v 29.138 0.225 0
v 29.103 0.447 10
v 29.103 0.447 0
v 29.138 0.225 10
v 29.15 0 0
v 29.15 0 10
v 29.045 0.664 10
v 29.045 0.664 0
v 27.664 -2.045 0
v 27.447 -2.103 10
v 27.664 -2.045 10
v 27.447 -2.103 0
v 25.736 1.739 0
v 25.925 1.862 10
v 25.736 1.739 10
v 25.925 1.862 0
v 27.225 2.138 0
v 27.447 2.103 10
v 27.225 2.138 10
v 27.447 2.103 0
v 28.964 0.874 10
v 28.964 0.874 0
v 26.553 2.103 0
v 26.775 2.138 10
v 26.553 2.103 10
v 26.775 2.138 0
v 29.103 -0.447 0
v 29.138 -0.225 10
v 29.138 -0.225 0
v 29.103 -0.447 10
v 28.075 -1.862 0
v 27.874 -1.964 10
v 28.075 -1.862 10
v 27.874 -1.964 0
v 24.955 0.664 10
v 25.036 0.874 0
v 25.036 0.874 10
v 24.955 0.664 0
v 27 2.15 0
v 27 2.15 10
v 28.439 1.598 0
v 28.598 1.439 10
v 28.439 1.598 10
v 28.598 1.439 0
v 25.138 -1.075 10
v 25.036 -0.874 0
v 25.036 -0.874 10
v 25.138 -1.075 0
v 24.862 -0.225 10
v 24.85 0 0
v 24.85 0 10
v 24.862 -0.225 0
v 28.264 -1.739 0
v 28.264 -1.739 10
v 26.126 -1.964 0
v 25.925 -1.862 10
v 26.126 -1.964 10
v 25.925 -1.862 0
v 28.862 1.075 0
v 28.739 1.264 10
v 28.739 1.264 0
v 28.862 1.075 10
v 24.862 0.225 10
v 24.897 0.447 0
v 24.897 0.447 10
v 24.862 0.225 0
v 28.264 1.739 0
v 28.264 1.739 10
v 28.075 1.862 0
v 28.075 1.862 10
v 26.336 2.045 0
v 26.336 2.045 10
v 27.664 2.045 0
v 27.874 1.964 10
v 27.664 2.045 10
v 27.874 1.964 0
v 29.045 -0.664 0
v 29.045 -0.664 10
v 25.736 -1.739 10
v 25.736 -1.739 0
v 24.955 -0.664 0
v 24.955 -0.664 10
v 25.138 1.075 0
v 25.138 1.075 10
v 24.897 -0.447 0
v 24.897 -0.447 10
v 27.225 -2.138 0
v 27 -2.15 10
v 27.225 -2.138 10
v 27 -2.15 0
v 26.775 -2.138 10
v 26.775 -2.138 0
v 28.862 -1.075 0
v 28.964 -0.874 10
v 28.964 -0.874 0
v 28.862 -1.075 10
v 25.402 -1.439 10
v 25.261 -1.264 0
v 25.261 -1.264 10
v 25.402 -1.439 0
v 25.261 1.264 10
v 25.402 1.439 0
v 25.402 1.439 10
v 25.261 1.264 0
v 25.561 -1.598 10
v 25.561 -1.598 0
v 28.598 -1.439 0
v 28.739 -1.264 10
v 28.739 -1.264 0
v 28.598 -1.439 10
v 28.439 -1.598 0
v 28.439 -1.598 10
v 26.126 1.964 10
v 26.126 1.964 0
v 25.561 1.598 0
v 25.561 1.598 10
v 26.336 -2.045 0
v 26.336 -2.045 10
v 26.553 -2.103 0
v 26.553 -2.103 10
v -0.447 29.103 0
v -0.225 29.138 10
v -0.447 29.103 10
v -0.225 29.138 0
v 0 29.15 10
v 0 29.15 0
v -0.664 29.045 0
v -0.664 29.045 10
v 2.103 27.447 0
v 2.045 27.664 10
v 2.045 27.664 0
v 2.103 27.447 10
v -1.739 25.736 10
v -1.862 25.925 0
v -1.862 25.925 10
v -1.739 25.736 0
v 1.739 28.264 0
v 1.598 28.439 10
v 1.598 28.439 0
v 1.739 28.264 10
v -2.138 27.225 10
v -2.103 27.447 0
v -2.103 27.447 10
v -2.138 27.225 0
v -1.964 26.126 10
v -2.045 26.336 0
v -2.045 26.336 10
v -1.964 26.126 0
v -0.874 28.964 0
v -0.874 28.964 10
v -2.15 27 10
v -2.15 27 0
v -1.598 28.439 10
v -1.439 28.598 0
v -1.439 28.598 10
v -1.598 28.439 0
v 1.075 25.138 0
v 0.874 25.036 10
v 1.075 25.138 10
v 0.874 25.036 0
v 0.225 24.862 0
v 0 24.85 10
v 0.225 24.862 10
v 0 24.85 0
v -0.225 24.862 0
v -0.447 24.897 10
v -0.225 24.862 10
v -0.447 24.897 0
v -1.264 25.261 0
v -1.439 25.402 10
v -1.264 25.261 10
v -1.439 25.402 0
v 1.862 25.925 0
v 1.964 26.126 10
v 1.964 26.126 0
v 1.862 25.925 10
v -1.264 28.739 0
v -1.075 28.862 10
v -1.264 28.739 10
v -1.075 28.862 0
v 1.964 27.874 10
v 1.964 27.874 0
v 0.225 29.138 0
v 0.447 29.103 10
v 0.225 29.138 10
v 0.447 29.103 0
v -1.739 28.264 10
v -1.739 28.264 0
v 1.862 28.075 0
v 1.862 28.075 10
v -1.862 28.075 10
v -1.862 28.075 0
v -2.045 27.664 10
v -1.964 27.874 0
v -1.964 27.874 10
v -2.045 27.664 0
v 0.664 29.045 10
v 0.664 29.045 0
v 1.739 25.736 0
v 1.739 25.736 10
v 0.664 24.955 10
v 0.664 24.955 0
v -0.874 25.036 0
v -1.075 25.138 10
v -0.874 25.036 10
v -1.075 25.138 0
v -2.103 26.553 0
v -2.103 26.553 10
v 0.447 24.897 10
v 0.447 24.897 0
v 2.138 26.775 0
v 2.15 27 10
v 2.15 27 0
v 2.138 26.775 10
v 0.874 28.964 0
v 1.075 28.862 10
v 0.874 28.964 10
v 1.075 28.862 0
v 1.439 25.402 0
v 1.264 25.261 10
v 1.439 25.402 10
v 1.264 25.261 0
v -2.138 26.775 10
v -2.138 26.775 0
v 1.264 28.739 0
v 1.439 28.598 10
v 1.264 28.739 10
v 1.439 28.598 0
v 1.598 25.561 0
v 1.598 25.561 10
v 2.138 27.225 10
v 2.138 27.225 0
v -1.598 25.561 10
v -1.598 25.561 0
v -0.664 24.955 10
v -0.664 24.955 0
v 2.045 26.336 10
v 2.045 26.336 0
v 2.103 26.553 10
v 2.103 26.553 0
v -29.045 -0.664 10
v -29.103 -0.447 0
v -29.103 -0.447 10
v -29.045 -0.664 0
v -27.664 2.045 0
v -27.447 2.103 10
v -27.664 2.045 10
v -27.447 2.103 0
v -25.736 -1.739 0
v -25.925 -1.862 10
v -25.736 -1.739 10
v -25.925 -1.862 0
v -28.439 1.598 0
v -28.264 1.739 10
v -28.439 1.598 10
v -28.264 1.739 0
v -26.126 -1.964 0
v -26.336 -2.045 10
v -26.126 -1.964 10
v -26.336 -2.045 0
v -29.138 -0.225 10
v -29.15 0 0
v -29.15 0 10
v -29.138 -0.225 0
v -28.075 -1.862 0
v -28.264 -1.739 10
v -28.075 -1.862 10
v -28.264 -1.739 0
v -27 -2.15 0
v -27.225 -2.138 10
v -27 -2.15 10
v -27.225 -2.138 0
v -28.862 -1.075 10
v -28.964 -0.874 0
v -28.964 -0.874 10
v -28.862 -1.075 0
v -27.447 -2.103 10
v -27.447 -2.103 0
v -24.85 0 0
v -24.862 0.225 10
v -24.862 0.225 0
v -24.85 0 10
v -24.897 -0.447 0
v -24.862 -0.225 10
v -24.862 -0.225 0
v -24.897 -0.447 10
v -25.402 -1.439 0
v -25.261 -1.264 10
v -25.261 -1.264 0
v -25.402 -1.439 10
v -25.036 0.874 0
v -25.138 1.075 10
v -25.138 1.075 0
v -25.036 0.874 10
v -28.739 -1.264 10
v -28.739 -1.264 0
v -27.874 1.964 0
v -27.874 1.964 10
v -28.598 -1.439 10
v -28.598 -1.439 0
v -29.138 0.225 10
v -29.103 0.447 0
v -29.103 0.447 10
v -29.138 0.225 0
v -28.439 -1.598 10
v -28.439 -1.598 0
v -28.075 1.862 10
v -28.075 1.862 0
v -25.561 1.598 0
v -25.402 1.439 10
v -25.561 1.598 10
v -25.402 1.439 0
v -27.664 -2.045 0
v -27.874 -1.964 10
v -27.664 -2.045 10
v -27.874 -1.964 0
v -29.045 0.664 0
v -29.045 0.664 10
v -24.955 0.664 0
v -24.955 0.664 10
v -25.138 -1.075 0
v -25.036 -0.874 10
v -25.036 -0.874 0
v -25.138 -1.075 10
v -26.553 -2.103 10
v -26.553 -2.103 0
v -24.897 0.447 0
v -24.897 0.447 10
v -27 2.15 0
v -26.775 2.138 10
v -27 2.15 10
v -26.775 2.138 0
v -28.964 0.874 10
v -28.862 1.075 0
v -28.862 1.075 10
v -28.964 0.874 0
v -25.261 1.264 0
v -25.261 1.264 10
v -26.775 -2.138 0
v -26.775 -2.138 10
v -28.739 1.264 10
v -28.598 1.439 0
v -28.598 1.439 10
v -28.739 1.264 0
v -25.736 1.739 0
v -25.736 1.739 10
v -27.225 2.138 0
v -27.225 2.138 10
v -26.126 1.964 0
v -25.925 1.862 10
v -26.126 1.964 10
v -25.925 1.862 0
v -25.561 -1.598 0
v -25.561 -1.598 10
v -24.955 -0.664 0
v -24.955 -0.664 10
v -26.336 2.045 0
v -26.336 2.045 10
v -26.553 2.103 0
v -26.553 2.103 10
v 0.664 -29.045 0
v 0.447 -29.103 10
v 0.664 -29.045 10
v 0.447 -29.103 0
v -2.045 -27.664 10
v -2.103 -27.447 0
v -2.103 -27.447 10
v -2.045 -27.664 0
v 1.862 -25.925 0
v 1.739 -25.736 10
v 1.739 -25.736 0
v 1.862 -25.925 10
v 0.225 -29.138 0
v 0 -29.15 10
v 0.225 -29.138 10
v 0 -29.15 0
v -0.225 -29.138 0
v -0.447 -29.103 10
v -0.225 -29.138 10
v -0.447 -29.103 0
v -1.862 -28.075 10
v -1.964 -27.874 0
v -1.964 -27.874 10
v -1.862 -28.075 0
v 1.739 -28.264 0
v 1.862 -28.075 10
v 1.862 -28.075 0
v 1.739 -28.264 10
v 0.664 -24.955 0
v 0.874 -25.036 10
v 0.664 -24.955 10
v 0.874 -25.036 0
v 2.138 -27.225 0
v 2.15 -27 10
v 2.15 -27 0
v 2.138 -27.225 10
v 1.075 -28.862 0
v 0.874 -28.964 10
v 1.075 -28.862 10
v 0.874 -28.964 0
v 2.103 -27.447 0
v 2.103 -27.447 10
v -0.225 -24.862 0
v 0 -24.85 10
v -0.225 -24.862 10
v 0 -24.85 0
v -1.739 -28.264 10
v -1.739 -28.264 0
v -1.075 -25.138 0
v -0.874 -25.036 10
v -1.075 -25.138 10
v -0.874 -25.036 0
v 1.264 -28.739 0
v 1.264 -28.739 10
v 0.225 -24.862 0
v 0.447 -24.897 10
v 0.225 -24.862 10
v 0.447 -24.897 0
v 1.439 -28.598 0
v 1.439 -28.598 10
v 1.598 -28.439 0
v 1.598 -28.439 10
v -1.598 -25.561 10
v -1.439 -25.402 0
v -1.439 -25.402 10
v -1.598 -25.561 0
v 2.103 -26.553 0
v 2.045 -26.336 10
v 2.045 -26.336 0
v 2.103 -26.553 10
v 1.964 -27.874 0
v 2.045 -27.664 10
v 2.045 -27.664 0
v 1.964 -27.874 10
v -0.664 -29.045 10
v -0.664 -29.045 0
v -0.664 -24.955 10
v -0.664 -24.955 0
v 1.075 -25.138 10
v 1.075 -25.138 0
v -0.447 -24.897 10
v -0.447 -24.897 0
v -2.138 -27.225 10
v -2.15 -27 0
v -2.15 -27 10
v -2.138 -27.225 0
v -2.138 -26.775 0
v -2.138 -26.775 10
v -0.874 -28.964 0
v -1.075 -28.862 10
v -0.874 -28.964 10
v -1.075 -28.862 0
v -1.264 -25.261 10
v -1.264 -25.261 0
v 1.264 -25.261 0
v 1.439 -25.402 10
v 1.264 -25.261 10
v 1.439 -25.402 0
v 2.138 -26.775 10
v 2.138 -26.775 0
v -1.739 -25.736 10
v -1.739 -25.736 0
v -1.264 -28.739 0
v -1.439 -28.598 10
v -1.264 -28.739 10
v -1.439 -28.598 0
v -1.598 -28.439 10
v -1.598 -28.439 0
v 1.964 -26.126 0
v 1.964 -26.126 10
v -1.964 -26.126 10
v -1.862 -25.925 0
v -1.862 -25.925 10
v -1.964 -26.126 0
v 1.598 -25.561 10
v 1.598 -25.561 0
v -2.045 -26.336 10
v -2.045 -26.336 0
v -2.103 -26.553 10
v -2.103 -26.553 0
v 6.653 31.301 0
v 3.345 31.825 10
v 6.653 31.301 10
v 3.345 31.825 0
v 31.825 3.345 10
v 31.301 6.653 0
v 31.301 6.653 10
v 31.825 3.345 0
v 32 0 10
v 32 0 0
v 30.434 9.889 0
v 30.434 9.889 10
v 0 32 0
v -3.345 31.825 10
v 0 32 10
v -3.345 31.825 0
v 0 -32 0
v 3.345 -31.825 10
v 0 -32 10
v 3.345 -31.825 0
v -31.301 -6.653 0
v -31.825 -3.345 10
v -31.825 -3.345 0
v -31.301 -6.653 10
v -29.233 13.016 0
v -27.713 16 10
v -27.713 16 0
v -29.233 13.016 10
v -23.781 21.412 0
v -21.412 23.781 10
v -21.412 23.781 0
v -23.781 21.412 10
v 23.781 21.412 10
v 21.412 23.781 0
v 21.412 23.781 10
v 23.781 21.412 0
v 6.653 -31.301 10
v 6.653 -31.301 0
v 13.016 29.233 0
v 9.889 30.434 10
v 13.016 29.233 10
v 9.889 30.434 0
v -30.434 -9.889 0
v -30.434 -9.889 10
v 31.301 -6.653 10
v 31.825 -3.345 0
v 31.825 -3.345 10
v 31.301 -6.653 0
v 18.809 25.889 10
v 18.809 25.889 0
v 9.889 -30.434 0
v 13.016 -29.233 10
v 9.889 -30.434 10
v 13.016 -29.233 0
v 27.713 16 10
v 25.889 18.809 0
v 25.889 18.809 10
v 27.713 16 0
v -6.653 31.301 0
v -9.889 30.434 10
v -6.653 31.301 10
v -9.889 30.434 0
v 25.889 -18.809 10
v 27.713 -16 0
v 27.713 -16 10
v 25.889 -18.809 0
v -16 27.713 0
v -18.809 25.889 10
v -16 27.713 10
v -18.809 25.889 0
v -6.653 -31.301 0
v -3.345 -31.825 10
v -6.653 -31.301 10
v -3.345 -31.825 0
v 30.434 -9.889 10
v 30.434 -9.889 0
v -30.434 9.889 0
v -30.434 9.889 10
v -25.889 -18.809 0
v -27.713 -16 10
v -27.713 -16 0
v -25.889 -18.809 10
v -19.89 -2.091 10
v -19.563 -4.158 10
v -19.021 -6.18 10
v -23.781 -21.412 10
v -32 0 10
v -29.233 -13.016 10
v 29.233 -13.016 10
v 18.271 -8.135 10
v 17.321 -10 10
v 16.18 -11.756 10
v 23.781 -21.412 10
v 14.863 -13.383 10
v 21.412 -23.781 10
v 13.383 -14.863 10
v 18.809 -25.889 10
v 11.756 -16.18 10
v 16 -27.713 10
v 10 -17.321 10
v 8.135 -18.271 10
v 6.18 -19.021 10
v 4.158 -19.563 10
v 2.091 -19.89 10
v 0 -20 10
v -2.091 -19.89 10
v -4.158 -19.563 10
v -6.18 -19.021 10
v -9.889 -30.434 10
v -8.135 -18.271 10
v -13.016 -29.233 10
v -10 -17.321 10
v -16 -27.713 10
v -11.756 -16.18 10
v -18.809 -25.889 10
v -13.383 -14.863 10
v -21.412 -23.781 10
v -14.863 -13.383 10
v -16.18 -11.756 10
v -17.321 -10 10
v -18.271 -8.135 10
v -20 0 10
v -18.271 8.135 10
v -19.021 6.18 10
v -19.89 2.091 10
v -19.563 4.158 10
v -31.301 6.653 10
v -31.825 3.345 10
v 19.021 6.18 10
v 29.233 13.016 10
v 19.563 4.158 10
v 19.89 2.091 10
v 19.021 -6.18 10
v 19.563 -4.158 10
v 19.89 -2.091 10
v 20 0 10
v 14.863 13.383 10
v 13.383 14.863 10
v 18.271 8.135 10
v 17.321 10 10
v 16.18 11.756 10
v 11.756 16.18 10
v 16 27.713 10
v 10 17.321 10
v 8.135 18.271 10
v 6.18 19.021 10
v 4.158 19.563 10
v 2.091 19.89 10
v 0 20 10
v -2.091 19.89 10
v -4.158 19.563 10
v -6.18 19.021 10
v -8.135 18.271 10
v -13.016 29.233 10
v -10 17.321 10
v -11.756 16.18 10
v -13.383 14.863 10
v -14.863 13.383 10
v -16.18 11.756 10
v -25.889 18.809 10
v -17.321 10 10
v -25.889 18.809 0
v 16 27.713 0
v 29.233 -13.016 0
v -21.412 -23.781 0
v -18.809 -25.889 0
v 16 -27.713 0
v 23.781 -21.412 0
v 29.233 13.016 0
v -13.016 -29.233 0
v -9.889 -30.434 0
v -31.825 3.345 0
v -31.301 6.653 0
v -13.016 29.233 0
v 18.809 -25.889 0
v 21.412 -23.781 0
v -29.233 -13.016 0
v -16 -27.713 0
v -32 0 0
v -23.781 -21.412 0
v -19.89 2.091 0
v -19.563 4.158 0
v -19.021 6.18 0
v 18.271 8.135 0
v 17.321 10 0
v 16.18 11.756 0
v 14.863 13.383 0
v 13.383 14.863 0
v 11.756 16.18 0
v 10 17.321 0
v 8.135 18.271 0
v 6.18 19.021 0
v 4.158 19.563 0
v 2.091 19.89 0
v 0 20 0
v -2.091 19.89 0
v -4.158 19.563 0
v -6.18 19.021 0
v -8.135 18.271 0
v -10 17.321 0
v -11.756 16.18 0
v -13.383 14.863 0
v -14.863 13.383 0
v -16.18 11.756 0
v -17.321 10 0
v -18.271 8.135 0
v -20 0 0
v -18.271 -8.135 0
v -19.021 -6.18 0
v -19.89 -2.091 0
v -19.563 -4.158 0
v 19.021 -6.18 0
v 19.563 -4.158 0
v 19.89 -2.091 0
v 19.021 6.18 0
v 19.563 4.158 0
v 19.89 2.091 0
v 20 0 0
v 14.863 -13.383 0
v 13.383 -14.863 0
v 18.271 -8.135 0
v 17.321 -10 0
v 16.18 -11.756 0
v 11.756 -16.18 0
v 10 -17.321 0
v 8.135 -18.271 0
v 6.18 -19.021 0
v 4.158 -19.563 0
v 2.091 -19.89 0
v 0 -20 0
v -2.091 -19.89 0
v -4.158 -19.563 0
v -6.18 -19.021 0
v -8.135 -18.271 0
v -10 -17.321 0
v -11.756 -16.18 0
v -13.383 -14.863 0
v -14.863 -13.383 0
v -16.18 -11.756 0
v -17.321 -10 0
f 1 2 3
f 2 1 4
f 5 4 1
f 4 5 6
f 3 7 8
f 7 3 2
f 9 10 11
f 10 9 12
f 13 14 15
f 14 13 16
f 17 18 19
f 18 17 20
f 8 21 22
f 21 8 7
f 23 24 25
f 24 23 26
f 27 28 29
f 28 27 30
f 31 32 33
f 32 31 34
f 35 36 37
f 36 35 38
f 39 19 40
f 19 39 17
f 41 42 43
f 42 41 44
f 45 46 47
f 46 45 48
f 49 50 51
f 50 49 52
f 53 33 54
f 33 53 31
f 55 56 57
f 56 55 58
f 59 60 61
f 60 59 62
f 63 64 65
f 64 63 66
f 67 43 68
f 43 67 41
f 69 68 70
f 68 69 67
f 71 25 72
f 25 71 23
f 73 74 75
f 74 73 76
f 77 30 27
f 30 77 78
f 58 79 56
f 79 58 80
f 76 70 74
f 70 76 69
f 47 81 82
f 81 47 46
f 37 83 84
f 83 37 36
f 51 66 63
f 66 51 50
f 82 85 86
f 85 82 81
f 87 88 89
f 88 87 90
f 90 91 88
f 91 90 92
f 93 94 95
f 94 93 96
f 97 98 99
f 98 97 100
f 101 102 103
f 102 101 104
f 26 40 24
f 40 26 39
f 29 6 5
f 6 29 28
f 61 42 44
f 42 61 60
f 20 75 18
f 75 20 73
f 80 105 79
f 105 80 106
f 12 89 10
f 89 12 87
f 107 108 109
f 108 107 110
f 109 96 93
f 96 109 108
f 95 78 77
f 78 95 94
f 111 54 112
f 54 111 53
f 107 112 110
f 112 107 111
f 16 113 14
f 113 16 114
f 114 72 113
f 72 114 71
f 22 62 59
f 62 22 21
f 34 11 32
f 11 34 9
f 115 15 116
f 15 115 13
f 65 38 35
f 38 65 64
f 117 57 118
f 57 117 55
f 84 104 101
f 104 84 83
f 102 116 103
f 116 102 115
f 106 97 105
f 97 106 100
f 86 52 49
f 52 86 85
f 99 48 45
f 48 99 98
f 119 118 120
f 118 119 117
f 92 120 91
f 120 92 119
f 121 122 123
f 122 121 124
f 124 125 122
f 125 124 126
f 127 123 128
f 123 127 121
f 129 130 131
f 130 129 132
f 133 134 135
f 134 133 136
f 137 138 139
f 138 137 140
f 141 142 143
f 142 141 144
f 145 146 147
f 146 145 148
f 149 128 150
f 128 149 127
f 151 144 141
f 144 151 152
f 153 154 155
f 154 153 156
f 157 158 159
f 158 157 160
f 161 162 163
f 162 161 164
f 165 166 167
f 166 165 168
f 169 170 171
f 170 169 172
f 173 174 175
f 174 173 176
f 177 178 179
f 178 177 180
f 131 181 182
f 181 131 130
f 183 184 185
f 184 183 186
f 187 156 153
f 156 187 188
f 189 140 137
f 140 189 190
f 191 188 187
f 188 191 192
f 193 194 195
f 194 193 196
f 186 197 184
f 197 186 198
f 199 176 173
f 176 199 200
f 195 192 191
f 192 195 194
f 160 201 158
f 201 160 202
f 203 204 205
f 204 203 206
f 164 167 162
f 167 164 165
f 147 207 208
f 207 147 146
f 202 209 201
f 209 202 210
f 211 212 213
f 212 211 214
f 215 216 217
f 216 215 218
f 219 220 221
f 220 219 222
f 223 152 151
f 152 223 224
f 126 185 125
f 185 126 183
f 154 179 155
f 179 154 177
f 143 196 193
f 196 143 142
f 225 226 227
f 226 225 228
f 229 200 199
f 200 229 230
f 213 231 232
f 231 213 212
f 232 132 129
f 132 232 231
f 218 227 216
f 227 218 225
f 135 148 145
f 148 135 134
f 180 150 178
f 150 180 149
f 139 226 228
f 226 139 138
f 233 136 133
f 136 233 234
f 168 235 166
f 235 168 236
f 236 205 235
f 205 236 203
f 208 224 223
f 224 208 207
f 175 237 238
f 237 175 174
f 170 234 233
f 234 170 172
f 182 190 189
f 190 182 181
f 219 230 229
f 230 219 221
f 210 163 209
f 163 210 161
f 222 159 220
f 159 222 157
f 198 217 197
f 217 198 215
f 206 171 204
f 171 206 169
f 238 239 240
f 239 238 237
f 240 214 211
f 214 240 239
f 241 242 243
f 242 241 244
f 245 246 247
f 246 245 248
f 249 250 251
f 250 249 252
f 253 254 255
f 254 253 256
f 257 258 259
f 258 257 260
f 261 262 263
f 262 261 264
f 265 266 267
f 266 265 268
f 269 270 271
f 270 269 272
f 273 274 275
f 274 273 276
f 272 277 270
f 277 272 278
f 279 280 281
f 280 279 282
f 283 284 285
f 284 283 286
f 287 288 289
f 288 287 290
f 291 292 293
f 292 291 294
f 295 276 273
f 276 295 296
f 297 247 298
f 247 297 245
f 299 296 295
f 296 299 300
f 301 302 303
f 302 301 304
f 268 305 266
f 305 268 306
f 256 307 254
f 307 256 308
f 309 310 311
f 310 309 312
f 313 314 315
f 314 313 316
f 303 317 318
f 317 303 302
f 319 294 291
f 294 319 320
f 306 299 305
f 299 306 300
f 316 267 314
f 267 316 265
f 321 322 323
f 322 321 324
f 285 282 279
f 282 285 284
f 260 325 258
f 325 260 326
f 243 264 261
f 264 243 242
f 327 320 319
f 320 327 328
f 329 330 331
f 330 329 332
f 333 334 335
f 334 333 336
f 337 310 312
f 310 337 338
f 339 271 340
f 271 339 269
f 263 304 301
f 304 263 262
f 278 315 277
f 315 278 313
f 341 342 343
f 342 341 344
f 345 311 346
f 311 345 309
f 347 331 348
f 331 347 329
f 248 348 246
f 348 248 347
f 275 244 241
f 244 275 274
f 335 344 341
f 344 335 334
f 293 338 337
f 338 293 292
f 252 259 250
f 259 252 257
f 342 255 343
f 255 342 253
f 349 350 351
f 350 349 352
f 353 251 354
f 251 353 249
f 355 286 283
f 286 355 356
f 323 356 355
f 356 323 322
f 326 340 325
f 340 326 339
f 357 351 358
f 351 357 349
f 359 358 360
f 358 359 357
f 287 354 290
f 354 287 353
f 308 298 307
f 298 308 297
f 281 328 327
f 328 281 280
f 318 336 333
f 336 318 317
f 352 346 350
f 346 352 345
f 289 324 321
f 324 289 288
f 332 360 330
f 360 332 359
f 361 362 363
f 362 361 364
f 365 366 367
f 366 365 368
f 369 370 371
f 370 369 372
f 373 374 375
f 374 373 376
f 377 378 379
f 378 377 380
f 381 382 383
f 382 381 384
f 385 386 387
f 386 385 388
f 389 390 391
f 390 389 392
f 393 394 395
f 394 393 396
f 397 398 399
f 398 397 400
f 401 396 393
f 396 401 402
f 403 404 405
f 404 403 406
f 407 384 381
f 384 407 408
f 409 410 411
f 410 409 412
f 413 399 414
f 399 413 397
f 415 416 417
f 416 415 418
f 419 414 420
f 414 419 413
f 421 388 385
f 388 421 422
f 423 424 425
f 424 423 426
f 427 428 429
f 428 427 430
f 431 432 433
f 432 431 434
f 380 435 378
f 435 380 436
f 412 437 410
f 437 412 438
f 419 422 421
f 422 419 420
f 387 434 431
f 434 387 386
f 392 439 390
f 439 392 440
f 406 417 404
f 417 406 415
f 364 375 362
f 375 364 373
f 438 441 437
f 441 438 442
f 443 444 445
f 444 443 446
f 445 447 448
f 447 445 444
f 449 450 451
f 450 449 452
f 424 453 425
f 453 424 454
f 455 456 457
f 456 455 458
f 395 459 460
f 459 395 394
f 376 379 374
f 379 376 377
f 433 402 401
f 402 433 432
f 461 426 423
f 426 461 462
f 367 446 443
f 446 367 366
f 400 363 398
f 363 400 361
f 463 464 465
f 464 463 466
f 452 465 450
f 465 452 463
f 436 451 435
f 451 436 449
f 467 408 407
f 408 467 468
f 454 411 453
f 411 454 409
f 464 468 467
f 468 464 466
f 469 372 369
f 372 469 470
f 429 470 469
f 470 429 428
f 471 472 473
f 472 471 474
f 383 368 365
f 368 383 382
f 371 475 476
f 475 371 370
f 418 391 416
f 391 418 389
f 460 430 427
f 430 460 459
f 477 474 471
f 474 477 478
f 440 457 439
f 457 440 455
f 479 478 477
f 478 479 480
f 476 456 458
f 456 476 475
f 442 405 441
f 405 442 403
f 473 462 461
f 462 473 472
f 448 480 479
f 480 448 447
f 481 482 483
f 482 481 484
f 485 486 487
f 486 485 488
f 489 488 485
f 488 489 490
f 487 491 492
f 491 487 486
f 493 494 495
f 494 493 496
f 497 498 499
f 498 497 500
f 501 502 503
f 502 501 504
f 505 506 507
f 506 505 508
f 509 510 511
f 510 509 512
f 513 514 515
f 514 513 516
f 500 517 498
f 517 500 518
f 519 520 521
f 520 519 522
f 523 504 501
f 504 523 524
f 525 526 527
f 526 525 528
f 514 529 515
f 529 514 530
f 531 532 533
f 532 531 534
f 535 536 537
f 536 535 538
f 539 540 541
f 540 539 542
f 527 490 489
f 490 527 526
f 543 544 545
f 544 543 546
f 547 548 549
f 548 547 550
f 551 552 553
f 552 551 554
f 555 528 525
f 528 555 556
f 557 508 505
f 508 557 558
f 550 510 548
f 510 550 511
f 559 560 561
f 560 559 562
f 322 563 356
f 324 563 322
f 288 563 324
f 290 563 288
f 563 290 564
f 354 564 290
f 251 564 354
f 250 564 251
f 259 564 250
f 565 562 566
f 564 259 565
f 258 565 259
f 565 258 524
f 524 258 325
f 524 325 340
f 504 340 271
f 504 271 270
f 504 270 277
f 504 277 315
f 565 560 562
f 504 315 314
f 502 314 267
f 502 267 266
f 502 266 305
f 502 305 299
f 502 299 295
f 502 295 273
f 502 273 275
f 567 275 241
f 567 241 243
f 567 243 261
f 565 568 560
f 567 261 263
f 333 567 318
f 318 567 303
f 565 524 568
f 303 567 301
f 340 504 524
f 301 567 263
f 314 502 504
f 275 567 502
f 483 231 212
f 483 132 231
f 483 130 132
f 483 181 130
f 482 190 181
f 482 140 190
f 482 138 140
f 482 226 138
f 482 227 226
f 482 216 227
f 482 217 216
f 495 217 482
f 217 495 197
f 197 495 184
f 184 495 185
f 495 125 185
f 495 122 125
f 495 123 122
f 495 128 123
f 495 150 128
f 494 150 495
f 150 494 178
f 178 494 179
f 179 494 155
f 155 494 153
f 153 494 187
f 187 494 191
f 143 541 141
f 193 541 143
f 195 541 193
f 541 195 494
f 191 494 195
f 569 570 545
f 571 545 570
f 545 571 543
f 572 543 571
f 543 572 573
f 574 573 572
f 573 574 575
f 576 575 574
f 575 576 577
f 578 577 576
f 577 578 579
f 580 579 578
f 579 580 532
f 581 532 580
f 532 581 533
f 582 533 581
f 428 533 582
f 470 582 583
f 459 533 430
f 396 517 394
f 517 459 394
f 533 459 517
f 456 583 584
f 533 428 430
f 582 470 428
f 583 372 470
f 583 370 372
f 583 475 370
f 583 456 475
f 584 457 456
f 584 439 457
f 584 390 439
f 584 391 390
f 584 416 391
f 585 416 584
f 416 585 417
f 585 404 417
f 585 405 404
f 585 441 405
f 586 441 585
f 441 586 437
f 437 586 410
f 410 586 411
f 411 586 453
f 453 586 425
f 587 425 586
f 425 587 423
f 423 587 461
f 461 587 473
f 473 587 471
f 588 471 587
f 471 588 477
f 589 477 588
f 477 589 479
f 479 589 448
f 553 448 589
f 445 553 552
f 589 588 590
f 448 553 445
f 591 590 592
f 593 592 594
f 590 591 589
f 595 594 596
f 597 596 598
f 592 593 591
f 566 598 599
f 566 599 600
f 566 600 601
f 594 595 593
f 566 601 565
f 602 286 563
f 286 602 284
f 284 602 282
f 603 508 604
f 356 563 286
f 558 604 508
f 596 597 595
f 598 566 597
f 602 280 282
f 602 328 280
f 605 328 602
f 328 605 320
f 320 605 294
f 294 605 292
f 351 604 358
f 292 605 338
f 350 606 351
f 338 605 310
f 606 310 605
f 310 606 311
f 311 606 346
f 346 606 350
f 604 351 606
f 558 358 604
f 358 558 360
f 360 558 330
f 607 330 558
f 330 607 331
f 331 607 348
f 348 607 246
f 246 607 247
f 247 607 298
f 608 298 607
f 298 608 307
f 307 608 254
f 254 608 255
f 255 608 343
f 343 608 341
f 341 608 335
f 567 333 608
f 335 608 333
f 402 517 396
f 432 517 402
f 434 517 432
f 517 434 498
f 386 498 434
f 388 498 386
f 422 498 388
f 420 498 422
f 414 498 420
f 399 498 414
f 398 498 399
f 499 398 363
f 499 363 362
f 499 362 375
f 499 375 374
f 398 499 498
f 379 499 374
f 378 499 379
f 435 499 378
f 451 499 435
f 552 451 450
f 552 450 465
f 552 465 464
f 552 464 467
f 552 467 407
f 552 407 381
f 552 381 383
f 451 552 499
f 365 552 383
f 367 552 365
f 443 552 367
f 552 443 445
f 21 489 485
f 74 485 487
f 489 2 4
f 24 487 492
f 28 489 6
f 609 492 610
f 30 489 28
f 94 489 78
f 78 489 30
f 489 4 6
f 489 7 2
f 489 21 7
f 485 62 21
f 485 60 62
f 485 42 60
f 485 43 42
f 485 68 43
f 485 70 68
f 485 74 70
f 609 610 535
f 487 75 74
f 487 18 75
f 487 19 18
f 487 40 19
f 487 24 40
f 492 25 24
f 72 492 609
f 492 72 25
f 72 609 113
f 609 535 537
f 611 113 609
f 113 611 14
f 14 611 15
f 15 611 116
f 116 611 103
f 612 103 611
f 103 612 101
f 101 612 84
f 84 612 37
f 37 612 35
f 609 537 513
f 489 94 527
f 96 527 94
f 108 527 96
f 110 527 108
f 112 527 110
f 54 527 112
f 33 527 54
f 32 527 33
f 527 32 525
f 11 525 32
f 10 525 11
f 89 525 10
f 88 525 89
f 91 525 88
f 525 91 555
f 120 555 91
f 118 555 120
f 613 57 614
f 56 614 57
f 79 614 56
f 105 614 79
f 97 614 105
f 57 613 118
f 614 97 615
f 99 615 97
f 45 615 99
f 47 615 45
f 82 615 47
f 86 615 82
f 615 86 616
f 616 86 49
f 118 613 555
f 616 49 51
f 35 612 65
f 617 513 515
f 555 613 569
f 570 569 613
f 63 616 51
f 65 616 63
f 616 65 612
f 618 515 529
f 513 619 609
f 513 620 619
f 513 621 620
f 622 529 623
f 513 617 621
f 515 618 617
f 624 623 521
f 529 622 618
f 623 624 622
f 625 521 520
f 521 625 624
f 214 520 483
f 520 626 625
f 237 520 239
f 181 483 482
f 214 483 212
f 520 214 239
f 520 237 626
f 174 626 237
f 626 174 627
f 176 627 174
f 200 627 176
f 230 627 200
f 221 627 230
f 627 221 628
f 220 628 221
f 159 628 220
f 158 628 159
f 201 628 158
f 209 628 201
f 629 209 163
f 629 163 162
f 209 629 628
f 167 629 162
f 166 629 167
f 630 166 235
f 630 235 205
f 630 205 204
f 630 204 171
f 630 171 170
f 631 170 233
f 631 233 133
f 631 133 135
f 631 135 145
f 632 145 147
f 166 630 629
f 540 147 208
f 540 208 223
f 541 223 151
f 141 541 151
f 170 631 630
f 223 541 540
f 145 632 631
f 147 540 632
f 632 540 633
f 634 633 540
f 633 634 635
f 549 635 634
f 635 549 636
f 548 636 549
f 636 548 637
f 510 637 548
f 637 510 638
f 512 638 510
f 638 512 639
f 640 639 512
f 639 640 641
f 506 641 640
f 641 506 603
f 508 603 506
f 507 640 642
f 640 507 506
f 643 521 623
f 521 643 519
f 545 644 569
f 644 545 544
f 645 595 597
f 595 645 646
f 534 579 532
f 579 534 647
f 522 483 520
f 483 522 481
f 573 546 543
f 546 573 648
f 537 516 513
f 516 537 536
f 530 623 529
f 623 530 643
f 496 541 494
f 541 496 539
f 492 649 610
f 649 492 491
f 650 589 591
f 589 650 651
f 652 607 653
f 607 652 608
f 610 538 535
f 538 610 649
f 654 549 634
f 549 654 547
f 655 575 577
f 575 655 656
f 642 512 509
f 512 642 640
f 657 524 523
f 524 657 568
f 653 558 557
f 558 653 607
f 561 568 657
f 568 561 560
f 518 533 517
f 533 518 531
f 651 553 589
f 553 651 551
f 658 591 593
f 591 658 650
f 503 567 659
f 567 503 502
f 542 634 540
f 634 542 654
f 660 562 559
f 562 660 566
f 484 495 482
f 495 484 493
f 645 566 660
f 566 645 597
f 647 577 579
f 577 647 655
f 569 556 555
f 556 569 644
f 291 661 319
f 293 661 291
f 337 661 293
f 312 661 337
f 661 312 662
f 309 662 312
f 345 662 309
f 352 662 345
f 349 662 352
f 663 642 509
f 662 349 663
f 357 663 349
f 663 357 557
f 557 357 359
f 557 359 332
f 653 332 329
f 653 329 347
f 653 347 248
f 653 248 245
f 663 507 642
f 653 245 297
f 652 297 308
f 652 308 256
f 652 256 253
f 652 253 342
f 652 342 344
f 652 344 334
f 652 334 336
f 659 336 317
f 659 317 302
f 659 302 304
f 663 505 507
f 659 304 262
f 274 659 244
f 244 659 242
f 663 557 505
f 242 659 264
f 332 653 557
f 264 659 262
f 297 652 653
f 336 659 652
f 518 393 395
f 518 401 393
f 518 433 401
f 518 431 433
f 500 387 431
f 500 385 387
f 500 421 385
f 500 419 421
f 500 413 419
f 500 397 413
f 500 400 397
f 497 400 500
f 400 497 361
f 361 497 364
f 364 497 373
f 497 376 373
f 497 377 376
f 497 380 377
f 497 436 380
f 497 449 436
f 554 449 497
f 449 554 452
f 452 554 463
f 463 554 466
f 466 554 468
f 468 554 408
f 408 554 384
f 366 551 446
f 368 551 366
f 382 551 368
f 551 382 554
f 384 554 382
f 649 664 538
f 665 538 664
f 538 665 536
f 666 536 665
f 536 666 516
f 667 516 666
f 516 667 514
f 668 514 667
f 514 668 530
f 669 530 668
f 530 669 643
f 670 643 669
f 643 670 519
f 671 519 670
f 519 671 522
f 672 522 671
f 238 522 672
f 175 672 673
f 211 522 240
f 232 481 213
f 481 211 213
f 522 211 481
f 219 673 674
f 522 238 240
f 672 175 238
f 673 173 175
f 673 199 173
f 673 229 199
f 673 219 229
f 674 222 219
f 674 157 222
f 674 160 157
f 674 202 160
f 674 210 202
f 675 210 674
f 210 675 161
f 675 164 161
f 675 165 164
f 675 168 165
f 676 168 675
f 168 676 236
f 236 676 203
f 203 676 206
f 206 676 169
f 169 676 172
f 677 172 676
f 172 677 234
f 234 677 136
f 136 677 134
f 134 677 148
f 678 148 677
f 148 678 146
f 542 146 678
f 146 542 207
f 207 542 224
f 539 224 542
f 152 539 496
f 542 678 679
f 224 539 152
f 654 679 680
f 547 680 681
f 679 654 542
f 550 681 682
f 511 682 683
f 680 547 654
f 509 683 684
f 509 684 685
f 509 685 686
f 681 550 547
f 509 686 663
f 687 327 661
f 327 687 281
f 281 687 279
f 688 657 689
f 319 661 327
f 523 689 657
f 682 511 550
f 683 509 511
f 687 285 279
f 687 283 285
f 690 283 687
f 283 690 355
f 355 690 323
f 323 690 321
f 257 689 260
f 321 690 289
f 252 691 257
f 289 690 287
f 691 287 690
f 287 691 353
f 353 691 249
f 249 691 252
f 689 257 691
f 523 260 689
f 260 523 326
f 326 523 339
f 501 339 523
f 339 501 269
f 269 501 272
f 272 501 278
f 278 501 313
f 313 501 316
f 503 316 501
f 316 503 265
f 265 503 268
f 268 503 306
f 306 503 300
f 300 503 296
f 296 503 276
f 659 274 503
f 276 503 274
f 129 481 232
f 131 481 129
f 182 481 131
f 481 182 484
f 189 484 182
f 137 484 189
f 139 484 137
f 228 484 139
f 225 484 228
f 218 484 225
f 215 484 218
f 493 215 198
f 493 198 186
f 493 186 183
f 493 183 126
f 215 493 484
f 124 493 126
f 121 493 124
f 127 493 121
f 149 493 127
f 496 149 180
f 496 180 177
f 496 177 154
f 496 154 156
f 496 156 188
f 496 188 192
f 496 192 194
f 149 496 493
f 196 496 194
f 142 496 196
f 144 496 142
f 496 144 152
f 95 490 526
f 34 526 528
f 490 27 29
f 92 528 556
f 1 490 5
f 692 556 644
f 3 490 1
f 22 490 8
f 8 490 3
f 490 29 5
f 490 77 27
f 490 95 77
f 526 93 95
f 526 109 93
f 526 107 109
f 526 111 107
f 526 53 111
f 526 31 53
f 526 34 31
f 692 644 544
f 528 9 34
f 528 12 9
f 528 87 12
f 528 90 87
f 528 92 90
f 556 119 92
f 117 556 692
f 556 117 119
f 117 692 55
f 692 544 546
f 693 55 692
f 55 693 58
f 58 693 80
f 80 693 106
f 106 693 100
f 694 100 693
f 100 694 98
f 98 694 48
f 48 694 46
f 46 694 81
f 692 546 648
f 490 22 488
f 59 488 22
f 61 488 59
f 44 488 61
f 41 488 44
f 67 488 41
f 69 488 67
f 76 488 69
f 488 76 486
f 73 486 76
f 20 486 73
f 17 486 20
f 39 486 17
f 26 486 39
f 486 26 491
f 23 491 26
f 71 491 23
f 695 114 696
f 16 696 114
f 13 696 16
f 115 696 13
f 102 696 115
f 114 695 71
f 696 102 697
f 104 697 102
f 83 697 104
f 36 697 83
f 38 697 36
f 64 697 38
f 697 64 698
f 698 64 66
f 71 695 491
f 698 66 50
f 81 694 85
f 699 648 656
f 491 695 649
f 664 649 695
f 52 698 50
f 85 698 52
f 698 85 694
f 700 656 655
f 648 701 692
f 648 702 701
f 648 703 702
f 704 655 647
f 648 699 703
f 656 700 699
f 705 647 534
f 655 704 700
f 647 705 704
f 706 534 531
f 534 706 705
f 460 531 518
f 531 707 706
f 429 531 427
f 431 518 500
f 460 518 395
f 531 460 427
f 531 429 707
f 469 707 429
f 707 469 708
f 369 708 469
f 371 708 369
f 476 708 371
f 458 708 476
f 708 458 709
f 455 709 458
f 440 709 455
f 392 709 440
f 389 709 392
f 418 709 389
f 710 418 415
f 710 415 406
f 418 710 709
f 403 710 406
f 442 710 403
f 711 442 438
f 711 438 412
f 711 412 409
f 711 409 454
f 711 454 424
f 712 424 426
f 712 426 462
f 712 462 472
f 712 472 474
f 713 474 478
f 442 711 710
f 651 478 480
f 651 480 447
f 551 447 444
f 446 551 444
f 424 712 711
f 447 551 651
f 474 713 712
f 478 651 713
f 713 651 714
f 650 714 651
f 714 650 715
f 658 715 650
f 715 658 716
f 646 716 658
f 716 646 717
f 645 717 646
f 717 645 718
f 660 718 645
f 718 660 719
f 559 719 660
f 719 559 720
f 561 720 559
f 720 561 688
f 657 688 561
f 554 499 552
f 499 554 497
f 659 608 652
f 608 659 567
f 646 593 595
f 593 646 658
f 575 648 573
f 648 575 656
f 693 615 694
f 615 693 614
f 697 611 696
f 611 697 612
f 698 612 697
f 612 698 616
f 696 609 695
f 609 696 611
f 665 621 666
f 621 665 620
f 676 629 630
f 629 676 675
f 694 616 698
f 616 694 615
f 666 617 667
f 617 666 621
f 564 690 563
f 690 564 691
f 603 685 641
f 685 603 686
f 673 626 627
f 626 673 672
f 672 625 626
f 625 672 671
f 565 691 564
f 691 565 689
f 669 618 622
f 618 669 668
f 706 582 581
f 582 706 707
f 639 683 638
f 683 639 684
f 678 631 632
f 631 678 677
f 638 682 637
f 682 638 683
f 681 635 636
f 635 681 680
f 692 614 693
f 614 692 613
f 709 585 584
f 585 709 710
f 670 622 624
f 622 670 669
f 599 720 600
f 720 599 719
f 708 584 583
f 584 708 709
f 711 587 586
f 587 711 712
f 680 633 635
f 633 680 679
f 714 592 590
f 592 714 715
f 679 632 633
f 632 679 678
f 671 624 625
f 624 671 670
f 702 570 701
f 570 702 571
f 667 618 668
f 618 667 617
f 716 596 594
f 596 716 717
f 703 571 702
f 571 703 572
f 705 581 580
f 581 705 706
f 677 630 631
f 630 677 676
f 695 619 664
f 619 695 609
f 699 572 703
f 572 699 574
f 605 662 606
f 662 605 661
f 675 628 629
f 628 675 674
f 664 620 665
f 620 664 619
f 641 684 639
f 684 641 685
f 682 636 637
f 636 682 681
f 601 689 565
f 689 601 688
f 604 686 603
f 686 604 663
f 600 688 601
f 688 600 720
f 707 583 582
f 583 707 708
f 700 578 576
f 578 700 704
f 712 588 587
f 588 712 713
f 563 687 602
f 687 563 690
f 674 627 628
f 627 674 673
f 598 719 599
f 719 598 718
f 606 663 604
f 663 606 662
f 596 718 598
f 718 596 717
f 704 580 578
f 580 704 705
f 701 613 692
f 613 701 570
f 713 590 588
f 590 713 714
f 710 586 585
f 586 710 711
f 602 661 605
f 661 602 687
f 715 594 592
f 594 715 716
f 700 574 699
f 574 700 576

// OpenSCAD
// Shaft-seal holder plate.
$fn = 60;
eps = 0.02;
seal_d = 40;
outer_d = 64;
plate_t = 10;
difference() { cylinder(d=outer_d,h=plate_t); translate([0,0,-eps]) cylinder(d=seal_d,h=plate_t+2*eps); for(i=[0:3]) rotate([0,0,i*90]) translate([outer_d/2-5,0,-eps]) cylinder(d=4.3,h=plate_t+2*eps); }
